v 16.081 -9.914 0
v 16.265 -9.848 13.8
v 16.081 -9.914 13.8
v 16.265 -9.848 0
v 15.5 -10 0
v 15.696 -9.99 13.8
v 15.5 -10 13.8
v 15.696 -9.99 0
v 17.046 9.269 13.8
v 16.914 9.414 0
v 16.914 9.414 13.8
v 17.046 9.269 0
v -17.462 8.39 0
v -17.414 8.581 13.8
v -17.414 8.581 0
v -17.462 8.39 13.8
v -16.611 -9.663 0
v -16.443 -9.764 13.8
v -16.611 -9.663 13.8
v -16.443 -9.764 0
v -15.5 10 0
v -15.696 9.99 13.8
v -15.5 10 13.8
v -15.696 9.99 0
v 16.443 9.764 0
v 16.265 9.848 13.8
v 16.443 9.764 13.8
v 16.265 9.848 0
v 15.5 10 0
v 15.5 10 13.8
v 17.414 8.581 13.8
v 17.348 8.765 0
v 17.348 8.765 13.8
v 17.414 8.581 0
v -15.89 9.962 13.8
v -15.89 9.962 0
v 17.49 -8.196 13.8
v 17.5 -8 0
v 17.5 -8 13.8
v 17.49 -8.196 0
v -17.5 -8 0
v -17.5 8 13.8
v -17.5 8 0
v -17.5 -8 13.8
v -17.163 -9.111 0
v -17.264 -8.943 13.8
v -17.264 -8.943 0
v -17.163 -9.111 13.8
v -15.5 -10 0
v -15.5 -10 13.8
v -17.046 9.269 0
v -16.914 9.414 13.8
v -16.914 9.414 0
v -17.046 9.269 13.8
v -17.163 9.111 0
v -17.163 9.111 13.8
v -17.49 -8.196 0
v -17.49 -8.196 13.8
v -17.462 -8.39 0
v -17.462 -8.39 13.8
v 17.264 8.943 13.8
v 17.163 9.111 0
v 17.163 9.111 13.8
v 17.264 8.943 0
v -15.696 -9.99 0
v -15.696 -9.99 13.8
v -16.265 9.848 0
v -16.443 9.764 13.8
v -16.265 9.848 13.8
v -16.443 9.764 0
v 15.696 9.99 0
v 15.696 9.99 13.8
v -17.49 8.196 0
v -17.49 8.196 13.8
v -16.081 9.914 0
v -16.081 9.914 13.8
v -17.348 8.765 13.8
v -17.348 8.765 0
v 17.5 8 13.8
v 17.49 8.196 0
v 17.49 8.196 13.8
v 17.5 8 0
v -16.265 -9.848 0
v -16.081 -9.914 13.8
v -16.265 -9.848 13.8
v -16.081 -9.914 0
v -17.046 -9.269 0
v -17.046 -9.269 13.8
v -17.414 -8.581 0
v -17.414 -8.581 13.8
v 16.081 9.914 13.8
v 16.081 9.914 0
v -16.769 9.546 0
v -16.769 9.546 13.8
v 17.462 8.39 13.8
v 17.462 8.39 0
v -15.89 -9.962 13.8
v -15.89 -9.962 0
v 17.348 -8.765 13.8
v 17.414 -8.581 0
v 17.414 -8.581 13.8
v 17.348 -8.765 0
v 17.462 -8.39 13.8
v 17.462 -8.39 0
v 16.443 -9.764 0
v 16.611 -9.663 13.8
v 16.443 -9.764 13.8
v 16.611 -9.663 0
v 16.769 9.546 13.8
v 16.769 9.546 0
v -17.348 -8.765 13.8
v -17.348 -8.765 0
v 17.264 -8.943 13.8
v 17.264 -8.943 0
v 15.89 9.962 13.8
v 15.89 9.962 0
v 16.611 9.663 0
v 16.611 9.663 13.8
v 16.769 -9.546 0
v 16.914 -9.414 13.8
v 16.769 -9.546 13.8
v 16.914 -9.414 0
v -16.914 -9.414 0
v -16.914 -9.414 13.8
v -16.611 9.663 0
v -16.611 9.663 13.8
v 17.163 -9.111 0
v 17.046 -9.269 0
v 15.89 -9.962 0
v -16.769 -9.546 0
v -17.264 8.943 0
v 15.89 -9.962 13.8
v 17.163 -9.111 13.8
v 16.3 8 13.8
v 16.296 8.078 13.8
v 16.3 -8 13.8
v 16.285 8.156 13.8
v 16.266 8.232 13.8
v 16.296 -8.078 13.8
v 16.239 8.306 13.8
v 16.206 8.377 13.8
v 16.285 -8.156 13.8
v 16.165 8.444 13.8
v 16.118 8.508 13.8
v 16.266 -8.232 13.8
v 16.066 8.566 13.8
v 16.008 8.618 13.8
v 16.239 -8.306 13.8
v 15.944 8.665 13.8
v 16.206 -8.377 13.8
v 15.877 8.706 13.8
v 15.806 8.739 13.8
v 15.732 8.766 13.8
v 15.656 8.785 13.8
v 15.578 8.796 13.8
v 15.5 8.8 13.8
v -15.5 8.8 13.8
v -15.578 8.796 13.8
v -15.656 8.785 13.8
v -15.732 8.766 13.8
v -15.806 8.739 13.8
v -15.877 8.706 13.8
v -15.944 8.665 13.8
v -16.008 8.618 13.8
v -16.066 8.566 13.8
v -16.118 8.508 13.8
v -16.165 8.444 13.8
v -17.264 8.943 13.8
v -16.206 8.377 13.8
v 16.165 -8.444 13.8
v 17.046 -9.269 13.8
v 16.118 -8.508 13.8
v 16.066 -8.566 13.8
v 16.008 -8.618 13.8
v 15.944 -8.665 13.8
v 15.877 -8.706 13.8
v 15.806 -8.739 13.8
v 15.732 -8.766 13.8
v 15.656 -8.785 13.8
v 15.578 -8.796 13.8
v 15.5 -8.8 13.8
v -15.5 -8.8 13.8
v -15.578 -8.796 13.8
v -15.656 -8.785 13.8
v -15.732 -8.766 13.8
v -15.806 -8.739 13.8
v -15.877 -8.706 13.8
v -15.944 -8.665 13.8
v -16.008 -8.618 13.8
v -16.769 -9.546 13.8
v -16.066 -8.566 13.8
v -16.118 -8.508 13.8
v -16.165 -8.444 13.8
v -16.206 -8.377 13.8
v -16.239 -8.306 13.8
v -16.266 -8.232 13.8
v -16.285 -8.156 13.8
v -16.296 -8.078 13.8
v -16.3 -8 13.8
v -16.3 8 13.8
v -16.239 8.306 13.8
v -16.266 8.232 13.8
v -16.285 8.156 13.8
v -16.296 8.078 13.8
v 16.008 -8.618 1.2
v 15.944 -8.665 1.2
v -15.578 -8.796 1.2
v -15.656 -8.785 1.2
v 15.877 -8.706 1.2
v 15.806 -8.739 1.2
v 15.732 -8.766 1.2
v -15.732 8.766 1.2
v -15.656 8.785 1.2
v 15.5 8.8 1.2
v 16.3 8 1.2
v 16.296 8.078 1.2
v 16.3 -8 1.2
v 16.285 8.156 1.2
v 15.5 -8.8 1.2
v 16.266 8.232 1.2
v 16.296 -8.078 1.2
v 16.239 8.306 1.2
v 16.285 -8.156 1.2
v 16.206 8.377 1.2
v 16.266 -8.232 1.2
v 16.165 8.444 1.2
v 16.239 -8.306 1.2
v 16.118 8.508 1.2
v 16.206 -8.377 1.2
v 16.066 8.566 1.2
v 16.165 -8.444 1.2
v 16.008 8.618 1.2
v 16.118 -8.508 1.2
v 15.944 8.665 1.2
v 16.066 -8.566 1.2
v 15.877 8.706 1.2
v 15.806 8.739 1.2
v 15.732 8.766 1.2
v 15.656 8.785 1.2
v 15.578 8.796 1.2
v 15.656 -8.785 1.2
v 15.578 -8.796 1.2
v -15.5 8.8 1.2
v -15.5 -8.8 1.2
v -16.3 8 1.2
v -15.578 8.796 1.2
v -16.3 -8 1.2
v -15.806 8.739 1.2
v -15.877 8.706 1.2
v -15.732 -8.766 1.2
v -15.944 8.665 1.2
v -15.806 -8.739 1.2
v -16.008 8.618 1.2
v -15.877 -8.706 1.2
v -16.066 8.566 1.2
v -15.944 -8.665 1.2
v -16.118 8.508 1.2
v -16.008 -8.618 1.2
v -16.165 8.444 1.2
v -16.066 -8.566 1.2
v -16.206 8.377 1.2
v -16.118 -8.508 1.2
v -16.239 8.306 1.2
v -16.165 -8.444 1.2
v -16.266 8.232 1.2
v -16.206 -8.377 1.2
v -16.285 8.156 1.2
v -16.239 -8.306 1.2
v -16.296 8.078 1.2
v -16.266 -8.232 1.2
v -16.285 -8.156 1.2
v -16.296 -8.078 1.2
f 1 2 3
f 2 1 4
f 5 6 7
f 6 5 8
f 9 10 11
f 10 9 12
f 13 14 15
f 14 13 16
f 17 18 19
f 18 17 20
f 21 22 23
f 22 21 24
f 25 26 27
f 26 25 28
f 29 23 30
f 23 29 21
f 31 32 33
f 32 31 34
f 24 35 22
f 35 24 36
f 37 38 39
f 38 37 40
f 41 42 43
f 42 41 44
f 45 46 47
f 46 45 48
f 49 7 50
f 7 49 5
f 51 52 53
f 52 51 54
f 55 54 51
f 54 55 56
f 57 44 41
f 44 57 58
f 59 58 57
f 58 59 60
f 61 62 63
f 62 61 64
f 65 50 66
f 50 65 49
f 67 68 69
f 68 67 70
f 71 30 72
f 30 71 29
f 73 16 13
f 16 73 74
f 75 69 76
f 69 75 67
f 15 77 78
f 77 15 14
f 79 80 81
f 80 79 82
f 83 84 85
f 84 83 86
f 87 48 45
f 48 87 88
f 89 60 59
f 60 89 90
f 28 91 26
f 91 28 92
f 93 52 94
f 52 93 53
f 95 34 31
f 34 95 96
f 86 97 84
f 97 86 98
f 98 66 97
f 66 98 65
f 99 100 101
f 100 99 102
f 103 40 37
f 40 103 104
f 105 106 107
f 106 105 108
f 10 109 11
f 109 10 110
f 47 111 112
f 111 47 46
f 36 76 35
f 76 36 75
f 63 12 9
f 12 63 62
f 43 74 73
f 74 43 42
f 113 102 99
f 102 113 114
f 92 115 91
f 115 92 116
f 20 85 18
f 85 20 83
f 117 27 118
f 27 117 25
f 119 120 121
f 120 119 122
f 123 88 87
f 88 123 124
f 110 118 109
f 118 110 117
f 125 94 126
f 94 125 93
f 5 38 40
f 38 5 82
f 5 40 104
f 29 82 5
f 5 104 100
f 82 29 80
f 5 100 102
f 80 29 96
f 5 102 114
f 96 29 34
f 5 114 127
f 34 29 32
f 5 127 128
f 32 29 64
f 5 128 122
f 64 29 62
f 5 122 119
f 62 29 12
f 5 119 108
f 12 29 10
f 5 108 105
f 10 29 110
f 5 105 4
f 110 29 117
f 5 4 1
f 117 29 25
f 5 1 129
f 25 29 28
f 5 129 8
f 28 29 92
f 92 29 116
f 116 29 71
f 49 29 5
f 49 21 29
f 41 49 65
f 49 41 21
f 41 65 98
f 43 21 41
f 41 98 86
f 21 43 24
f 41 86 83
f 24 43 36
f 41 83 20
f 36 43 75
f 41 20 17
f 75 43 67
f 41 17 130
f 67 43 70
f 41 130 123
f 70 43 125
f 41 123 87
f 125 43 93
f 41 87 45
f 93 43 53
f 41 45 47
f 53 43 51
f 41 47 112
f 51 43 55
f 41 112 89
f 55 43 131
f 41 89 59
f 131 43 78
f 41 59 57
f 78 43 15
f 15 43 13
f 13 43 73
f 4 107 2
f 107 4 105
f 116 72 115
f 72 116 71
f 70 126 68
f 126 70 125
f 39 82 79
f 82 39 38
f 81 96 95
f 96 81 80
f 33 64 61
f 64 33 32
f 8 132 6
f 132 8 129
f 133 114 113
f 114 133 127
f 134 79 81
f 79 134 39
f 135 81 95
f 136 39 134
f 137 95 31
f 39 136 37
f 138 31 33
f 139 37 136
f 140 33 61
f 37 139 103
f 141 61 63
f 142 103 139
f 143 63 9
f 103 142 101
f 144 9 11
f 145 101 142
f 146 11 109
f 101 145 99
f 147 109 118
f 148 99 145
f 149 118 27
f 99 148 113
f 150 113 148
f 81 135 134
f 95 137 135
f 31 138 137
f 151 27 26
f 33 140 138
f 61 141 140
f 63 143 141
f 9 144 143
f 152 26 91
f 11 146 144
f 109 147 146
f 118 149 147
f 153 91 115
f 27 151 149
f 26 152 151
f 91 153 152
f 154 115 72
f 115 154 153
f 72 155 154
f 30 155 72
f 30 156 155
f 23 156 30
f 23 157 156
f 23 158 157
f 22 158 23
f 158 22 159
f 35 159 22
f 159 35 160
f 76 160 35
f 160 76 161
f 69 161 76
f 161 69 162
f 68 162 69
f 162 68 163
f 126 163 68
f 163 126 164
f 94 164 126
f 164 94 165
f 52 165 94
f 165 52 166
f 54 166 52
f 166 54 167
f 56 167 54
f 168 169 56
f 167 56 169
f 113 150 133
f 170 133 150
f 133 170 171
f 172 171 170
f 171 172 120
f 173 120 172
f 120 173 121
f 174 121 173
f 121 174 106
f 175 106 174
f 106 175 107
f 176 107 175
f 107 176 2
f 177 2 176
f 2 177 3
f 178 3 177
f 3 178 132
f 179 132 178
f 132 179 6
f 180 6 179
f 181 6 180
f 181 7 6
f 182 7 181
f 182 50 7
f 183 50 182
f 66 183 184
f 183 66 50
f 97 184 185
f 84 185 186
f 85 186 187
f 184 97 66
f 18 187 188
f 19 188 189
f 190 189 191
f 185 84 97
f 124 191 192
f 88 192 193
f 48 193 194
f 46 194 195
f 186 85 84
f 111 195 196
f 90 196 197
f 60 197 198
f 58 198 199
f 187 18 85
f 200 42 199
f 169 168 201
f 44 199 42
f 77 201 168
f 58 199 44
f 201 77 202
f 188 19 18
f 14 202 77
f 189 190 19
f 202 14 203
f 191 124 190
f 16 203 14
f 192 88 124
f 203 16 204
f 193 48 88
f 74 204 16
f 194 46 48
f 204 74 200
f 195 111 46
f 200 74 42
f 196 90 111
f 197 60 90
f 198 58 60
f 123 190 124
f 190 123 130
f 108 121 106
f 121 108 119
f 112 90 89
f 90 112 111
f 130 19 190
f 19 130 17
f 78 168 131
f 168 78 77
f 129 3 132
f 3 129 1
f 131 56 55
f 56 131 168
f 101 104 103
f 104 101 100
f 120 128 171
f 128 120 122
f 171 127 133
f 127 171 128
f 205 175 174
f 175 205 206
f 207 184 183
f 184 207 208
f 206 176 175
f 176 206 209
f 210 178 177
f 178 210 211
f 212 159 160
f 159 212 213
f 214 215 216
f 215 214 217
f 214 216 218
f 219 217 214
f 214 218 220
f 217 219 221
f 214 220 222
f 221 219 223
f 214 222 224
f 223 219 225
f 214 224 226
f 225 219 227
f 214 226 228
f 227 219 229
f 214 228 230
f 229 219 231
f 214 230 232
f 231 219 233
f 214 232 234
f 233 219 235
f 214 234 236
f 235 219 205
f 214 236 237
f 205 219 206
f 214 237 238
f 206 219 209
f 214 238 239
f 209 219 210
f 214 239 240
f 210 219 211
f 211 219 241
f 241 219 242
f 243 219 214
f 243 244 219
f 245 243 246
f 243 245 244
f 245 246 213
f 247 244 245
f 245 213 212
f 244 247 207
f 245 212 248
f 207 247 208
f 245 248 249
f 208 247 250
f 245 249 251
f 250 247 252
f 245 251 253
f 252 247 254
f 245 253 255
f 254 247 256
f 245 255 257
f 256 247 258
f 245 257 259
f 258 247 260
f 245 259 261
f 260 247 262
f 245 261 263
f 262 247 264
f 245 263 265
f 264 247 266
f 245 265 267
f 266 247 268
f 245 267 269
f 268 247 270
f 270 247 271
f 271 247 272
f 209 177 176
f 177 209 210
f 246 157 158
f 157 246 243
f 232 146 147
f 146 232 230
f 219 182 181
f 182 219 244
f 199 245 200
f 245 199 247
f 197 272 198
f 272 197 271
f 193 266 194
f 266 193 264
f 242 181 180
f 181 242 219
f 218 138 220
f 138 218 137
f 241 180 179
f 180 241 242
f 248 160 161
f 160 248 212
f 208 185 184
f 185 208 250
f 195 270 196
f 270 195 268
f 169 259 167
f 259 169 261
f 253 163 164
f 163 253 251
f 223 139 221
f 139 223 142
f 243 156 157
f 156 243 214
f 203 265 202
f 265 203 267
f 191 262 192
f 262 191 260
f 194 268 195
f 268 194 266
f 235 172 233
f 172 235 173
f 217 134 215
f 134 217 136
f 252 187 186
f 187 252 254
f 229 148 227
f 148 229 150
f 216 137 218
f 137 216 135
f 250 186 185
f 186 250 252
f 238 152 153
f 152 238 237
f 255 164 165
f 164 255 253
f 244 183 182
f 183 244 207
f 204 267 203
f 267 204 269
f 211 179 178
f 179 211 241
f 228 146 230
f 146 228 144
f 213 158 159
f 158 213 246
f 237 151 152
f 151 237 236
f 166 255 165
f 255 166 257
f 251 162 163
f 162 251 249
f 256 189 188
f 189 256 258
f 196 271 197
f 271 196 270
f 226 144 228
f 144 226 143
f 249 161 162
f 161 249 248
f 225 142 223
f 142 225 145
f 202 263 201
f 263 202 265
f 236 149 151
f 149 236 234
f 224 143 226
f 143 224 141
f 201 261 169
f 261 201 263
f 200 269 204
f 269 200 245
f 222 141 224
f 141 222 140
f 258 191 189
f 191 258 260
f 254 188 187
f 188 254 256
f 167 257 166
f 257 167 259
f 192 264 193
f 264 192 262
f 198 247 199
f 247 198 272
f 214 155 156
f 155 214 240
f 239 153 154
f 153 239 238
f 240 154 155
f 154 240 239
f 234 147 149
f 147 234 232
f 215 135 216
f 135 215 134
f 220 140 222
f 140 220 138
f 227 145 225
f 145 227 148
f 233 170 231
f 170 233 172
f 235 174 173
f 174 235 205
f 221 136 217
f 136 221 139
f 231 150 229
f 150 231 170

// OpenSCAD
// Parametric 35 x 20 mm POC medicine carrier and magazine tube
// Change `part` to export a specific component.
part = "container_body";
// Options: container_body, lid_normal, lid_loose, lid_tight,
// dummy_container, tube_180, tube_90, tube_cap, dummy_blister

$fn = 64;
container_l = 35.0;
container_w = 20.0;
container_h = 15.0;
body_h = 13.8;
wall = 1.2;
bottom = 1.2;
outer_r = 2.0;
lid_top_t = 1.2;
lid_plug_d = 1.4;
lid_top_l = 34.6;
lid_top_w = 19.6;

tube_in_l = 36.2;
tube_in_w = 21.2;
tube_in_r = 2.4;
tube_wall = 2.4;
tube_out_l = 41.0;
tube_out_w = 26.0;
tube_out_r = 4.8;
flange_l = 58.0;
flange_w = 42.0;
flange_t = 4.0;
flange_hole_d = 4.5;
flange_hole_dx = 46.0;
flange_hole_dy = 30.0;

module rr2d(l,w,r) {
    offset(r=r) square([l-2*r,w-2*r], center=true);
}

module container_body() {
    difference() {
        linear_extrude(body_h) rr2d(container_l,container_w,outer_r);
        translate([0,0,bottom])
            linear_extrude(body_h-bottom+0.2)
                rr2d(container_l-2*wall,container_w-2*wall,max(0.6,outer_r-wall));
    }
}

module lid(clearance=0.30) {
    cavity_l = container_l - 2*wall;
    cavity_w = container_w - 2*wall;
    union() {
        linear_extrude(lid_plug_d)
            rr2d(cavity_l-2*clearance,cavity_w-2*clearance,max(0.5,outer_r-wall-clearance));
        translate([0,0,lid_plug_d])
            linear_extrude(lid_top_t)
                rr2d(lid_top_l,lid_top_w,outer_r-0.2);
    }
}

module dummy_container() {
    linear_extrude(container_h) rr2d(container_l,container_w,outer_r);
}

module magazine_tube(h=180) {
    difference() {
        union() {
            linear_extrude(flange_t) rr2d(flange_l,flange_w,5);
            translate([0,0,flange_t])
                linear_extrude(h)
                    difference() {
                        rr2d(tube_out_l,tube_out_w,tube_out_r);
                        rr2d(tube_in_l,tube_in_w,tube_in_r);
                    }
        }
        translate([0,0,-0.1])
            linear_extrude(h+flange_t+0.2)
                rr2d(tube_in_l,tube_in_w,tube_in_r);
        for (x=[-flange_hole_dx/2,flange_hole_dx/2])
            for (y=[-flange_hole_dy/2,flange_hole_dy/2])
                translate([x,y,-0.1]) cylinder(d=flange_hole_d,h=flange_t+0.2);
    }
}

module tube_cap() {
    union() {
        linear_extrude(3.0)
            rr2d(tube_in_l-0.4,tube_in_w-0.4,2.1999999999999997);
        translate([0,0,3.0])
            linear_extrude(2.0) rr2d(42.0,27.0,4);
    }
}

module dummy_blister() {
    linear_extrude(8.0)
        rr2d(30.0,15.0,3.5);
}

if (part == "container_body") container_body();
else if (part == "lid_normal") lid(0.30);
else if (part == "lid_loose") lid(0.40);
else if (part == "lid_tight") lid(0.20);
else if (part == "dummy_container") dummy_container();
else if (part == "tube_180") magazine_tube(180);
else if (part == "tube_90") magazine_tube(90);
else if (part == "tube_cap") tube_cap();
else if (part == "dummy_blister") dummy_blister();
